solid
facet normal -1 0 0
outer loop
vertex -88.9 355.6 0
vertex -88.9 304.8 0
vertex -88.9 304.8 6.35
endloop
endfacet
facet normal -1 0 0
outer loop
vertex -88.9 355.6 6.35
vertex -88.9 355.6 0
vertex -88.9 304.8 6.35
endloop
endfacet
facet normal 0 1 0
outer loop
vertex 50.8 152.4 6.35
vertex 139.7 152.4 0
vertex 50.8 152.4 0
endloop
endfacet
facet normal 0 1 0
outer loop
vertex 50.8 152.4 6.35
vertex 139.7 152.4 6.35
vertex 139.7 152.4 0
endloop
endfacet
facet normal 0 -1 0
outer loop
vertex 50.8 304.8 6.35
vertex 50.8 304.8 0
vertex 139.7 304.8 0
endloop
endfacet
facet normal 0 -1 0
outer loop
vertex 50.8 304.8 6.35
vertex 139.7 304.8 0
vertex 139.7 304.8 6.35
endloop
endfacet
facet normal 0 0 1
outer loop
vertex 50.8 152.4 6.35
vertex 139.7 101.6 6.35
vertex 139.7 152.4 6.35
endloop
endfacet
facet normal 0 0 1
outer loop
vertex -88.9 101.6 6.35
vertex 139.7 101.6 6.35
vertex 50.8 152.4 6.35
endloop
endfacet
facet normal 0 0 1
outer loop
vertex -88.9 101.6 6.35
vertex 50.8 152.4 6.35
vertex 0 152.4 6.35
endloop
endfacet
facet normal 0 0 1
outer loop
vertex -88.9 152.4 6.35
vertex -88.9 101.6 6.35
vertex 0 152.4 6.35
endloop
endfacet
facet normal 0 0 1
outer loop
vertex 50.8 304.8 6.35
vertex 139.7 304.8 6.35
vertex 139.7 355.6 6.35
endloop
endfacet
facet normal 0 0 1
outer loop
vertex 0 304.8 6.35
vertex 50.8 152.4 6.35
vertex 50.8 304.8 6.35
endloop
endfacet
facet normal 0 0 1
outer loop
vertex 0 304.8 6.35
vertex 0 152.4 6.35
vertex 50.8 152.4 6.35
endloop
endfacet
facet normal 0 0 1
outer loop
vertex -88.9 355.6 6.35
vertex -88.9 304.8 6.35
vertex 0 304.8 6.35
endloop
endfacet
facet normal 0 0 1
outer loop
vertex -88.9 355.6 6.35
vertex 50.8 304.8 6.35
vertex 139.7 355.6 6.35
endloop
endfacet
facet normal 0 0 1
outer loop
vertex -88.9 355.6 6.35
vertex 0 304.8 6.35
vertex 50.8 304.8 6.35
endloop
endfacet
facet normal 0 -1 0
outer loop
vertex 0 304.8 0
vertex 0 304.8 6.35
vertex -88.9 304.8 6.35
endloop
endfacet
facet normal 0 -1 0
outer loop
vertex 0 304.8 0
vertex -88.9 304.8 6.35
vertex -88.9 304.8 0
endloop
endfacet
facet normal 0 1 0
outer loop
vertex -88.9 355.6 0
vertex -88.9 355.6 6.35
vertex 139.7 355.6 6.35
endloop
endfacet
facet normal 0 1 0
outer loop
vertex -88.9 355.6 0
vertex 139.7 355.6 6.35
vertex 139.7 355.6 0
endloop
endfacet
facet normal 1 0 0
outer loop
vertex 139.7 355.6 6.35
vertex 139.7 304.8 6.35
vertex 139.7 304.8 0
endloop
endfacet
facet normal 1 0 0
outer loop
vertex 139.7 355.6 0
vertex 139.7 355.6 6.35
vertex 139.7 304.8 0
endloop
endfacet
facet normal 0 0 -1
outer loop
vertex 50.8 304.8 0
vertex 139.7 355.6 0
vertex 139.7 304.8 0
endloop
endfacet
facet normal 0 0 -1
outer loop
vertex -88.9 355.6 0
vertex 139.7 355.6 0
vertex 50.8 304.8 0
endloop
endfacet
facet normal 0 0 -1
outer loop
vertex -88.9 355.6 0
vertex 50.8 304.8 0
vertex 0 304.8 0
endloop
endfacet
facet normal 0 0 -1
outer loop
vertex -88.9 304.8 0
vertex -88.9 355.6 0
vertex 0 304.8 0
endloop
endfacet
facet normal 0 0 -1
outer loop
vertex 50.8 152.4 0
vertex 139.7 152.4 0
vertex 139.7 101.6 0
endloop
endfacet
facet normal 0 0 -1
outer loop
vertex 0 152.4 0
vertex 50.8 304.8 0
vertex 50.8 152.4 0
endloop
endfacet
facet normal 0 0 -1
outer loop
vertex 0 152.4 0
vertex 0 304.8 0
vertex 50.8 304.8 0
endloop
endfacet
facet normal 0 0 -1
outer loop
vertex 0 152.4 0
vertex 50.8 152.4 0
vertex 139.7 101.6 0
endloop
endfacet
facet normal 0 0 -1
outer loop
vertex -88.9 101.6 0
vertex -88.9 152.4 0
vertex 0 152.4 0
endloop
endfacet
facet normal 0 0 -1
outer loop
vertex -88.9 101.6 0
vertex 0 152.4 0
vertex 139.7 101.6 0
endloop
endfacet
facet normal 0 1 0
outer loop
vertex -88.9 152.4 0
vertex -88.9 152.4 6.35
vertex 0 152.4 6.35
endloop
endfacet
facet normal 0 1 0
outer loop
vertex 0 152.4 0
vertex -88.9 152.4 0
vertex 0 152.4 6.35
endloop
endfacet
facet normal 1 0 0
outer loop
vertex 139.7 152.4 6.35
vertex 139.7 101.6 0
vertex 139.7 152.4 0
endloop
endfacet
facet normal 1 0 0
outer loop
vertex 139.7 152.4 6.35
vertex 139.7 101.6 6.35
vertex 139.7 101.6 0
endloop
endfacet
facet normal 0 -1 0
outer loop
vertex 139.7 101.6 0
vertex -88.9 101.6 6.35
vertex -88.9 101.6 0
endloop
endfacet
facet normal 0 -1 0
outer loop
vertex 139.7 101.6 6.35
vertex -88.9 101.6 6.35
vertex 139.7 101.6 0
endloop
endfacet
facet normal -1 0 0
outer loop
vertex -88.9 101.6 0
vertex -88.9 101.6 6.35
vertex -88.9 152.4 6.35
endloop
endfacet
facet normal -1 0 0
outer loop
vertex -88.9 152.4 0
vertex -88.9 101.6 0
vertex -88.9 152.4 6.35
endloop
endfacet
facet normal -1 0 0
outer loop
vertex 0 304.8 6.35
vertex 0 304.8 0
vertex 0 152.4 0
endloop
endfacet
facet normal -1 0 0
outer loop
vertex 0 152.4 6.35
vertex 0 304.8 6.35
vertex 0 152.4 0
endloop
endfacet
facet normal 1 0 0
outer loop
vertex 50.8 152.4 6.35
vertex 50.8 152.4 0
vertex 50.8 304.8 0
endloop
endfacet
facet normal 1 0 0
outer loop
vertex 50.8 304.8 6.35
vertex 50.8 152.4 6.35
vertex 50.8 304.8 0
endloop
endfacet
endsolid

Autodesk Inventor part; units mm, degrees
ref_plane "YZ Plane" through (0, 0, 0) normal (1, 0, 0) x (0, 1, 0)
ref_plane "XZ Plane" through (0, 0, 0) normal (0, 1, 0) x (-1, 0, 0)
ref_plane "XY Plane" through (0, 0, 0) normal (0, 0, 1) x (1, 0, 0)
sketch "Sketch1" plane through (0, 0, 0) normal (0, 0, 1) x (1, 0, 0)
  line L0 (0, 0) -> (50.8, 0)
  line L1 (50.8, 0) -> (50.8, 355.6)
  line L2 (50.8, 355.6) -> (0, 355.6)
  line L3 (0, 355.6) -> (0, 0)
  dimension "d0" = 50.8
  dimension "d1" = 355.6
extrude "Extrusion1" add sketch "Sketch1" along normal blind 6.35
sketch "Sketch2" plane through (0, 0, 6.35) normal (0, 0, 1) x (1, 0, 0)
  line L0 (50.8, 0) -> (50.8, 355.6) projected
  line L1 (50.8, 152.4) -> (50.8, 203.2)
  line L2 (0, 152.4) -> (0, 203.2)
  line L3 (0, 355.6) -> (0, 0) projected
  line L4 (-88.9, 254) -> (0, 254)
  line L5 (0, 254) -> (0, 203.2)
  line L6 (0, 203.2) -> (-88.9, 203.2)
  line L7 (-88.9, 203.2) -> (-88.9, 254)
  line L8 (-88.9, 152.4) -> (0, 152.4)
  line L9 (0, 152.4) -> (0, 101.6)
  line L10 (0, 101.6) -> (-88.9, 101.6)
  line L11 (-88.9, 101.6) -> (-88.9, 152.4)
  line L12 (50.8, 101.6) -> (139.7, 101.6)
  line L13 (139.7, 101.6) -> (139.7, 152.4)
  line L14 (139.7, 152.4) -> (50.8, 152.4)
  line L15 (50.8, 152.4) -> (50.8, 101.6)
  line L16 (139.7, 203.2) -> (50.8, 203.2)
  line L17 (50.8, 203.2) -> (50.8, 254)
  line L18 (50.8, 254) -> (139.7, 254)
  line L19 (139.7, 254) -> (139.7, 203.2)
  point P0 (50.8, 152.4)
  point P1 (-88.9, 107.5788)
  point P2 (0, 254)
extrude "Extrusion3" add sketch "Sketch2" against normal blind 6.35
thicken "Thicken1" operation add thickness 101.6 both sides no extend neighbours yes toward (0, 1, 0) faces at (16.9333, 0, 2.1167)
thicken "Thicken2" operation add thickness 88.9 both sides no extend neighbours yes toward (-1, 0, 0) faces at (139.7, 220.1333, 2.1167)
thicken "Thicken3" operation add thickness 88.9 both sides no extend neighbours yes toward (1, 0, 0) faces at (-88.9, 237.0667, 2.1167)
sketch "Sketch3" plane through (0, 152.4, 0) normal (-1, 0, 0) x (0, 0, 1)
  line L0 (0, 203.2) -> (6.35, 203.2) projected
  line L1 (0, 0) -> (0, 203.2) projected
  line L2 (6.35, 0) -> (6.35, 203.2) projected
  line L3 (0, 203.2) -> (6.35, 203.2)
  line L4 (6.35, 203.2) -> (6.35, 152.4)
  line L5 (6.35, 152.4) -> (0, 152.4)
  line L6 (0, 152.4) -> (0, 203.2)
  point P0 (0, -152.4)
extrude "Extrusion4" add sketch "Sketch3" along normal blind 88.9
sketch "Sketch4" plane through (50.8, 152.4, 0) normal (1, 0, 0) x (0, 0, -1)
  line L0 (-6.35, 152.4) -> (-6.35, 203.2) projected
  line L1 (0, 152.4) -> (0, 0) projected
  line L2 (-6.35, 203.2) -> (0, 203.2)
  line L3 (0, 203.2) -> (0, 152.4)
  line L4 (0, 152.4) -> (-6.35, 152.4)
  line L5 (-6.35, 152.4) -> (-6.35, 203.2)
  point P0 (0, -152.4)
extrude "Extrusion5" add sketch "Sketch4" along normal blind 88.9
properties part number "backplatelift"
